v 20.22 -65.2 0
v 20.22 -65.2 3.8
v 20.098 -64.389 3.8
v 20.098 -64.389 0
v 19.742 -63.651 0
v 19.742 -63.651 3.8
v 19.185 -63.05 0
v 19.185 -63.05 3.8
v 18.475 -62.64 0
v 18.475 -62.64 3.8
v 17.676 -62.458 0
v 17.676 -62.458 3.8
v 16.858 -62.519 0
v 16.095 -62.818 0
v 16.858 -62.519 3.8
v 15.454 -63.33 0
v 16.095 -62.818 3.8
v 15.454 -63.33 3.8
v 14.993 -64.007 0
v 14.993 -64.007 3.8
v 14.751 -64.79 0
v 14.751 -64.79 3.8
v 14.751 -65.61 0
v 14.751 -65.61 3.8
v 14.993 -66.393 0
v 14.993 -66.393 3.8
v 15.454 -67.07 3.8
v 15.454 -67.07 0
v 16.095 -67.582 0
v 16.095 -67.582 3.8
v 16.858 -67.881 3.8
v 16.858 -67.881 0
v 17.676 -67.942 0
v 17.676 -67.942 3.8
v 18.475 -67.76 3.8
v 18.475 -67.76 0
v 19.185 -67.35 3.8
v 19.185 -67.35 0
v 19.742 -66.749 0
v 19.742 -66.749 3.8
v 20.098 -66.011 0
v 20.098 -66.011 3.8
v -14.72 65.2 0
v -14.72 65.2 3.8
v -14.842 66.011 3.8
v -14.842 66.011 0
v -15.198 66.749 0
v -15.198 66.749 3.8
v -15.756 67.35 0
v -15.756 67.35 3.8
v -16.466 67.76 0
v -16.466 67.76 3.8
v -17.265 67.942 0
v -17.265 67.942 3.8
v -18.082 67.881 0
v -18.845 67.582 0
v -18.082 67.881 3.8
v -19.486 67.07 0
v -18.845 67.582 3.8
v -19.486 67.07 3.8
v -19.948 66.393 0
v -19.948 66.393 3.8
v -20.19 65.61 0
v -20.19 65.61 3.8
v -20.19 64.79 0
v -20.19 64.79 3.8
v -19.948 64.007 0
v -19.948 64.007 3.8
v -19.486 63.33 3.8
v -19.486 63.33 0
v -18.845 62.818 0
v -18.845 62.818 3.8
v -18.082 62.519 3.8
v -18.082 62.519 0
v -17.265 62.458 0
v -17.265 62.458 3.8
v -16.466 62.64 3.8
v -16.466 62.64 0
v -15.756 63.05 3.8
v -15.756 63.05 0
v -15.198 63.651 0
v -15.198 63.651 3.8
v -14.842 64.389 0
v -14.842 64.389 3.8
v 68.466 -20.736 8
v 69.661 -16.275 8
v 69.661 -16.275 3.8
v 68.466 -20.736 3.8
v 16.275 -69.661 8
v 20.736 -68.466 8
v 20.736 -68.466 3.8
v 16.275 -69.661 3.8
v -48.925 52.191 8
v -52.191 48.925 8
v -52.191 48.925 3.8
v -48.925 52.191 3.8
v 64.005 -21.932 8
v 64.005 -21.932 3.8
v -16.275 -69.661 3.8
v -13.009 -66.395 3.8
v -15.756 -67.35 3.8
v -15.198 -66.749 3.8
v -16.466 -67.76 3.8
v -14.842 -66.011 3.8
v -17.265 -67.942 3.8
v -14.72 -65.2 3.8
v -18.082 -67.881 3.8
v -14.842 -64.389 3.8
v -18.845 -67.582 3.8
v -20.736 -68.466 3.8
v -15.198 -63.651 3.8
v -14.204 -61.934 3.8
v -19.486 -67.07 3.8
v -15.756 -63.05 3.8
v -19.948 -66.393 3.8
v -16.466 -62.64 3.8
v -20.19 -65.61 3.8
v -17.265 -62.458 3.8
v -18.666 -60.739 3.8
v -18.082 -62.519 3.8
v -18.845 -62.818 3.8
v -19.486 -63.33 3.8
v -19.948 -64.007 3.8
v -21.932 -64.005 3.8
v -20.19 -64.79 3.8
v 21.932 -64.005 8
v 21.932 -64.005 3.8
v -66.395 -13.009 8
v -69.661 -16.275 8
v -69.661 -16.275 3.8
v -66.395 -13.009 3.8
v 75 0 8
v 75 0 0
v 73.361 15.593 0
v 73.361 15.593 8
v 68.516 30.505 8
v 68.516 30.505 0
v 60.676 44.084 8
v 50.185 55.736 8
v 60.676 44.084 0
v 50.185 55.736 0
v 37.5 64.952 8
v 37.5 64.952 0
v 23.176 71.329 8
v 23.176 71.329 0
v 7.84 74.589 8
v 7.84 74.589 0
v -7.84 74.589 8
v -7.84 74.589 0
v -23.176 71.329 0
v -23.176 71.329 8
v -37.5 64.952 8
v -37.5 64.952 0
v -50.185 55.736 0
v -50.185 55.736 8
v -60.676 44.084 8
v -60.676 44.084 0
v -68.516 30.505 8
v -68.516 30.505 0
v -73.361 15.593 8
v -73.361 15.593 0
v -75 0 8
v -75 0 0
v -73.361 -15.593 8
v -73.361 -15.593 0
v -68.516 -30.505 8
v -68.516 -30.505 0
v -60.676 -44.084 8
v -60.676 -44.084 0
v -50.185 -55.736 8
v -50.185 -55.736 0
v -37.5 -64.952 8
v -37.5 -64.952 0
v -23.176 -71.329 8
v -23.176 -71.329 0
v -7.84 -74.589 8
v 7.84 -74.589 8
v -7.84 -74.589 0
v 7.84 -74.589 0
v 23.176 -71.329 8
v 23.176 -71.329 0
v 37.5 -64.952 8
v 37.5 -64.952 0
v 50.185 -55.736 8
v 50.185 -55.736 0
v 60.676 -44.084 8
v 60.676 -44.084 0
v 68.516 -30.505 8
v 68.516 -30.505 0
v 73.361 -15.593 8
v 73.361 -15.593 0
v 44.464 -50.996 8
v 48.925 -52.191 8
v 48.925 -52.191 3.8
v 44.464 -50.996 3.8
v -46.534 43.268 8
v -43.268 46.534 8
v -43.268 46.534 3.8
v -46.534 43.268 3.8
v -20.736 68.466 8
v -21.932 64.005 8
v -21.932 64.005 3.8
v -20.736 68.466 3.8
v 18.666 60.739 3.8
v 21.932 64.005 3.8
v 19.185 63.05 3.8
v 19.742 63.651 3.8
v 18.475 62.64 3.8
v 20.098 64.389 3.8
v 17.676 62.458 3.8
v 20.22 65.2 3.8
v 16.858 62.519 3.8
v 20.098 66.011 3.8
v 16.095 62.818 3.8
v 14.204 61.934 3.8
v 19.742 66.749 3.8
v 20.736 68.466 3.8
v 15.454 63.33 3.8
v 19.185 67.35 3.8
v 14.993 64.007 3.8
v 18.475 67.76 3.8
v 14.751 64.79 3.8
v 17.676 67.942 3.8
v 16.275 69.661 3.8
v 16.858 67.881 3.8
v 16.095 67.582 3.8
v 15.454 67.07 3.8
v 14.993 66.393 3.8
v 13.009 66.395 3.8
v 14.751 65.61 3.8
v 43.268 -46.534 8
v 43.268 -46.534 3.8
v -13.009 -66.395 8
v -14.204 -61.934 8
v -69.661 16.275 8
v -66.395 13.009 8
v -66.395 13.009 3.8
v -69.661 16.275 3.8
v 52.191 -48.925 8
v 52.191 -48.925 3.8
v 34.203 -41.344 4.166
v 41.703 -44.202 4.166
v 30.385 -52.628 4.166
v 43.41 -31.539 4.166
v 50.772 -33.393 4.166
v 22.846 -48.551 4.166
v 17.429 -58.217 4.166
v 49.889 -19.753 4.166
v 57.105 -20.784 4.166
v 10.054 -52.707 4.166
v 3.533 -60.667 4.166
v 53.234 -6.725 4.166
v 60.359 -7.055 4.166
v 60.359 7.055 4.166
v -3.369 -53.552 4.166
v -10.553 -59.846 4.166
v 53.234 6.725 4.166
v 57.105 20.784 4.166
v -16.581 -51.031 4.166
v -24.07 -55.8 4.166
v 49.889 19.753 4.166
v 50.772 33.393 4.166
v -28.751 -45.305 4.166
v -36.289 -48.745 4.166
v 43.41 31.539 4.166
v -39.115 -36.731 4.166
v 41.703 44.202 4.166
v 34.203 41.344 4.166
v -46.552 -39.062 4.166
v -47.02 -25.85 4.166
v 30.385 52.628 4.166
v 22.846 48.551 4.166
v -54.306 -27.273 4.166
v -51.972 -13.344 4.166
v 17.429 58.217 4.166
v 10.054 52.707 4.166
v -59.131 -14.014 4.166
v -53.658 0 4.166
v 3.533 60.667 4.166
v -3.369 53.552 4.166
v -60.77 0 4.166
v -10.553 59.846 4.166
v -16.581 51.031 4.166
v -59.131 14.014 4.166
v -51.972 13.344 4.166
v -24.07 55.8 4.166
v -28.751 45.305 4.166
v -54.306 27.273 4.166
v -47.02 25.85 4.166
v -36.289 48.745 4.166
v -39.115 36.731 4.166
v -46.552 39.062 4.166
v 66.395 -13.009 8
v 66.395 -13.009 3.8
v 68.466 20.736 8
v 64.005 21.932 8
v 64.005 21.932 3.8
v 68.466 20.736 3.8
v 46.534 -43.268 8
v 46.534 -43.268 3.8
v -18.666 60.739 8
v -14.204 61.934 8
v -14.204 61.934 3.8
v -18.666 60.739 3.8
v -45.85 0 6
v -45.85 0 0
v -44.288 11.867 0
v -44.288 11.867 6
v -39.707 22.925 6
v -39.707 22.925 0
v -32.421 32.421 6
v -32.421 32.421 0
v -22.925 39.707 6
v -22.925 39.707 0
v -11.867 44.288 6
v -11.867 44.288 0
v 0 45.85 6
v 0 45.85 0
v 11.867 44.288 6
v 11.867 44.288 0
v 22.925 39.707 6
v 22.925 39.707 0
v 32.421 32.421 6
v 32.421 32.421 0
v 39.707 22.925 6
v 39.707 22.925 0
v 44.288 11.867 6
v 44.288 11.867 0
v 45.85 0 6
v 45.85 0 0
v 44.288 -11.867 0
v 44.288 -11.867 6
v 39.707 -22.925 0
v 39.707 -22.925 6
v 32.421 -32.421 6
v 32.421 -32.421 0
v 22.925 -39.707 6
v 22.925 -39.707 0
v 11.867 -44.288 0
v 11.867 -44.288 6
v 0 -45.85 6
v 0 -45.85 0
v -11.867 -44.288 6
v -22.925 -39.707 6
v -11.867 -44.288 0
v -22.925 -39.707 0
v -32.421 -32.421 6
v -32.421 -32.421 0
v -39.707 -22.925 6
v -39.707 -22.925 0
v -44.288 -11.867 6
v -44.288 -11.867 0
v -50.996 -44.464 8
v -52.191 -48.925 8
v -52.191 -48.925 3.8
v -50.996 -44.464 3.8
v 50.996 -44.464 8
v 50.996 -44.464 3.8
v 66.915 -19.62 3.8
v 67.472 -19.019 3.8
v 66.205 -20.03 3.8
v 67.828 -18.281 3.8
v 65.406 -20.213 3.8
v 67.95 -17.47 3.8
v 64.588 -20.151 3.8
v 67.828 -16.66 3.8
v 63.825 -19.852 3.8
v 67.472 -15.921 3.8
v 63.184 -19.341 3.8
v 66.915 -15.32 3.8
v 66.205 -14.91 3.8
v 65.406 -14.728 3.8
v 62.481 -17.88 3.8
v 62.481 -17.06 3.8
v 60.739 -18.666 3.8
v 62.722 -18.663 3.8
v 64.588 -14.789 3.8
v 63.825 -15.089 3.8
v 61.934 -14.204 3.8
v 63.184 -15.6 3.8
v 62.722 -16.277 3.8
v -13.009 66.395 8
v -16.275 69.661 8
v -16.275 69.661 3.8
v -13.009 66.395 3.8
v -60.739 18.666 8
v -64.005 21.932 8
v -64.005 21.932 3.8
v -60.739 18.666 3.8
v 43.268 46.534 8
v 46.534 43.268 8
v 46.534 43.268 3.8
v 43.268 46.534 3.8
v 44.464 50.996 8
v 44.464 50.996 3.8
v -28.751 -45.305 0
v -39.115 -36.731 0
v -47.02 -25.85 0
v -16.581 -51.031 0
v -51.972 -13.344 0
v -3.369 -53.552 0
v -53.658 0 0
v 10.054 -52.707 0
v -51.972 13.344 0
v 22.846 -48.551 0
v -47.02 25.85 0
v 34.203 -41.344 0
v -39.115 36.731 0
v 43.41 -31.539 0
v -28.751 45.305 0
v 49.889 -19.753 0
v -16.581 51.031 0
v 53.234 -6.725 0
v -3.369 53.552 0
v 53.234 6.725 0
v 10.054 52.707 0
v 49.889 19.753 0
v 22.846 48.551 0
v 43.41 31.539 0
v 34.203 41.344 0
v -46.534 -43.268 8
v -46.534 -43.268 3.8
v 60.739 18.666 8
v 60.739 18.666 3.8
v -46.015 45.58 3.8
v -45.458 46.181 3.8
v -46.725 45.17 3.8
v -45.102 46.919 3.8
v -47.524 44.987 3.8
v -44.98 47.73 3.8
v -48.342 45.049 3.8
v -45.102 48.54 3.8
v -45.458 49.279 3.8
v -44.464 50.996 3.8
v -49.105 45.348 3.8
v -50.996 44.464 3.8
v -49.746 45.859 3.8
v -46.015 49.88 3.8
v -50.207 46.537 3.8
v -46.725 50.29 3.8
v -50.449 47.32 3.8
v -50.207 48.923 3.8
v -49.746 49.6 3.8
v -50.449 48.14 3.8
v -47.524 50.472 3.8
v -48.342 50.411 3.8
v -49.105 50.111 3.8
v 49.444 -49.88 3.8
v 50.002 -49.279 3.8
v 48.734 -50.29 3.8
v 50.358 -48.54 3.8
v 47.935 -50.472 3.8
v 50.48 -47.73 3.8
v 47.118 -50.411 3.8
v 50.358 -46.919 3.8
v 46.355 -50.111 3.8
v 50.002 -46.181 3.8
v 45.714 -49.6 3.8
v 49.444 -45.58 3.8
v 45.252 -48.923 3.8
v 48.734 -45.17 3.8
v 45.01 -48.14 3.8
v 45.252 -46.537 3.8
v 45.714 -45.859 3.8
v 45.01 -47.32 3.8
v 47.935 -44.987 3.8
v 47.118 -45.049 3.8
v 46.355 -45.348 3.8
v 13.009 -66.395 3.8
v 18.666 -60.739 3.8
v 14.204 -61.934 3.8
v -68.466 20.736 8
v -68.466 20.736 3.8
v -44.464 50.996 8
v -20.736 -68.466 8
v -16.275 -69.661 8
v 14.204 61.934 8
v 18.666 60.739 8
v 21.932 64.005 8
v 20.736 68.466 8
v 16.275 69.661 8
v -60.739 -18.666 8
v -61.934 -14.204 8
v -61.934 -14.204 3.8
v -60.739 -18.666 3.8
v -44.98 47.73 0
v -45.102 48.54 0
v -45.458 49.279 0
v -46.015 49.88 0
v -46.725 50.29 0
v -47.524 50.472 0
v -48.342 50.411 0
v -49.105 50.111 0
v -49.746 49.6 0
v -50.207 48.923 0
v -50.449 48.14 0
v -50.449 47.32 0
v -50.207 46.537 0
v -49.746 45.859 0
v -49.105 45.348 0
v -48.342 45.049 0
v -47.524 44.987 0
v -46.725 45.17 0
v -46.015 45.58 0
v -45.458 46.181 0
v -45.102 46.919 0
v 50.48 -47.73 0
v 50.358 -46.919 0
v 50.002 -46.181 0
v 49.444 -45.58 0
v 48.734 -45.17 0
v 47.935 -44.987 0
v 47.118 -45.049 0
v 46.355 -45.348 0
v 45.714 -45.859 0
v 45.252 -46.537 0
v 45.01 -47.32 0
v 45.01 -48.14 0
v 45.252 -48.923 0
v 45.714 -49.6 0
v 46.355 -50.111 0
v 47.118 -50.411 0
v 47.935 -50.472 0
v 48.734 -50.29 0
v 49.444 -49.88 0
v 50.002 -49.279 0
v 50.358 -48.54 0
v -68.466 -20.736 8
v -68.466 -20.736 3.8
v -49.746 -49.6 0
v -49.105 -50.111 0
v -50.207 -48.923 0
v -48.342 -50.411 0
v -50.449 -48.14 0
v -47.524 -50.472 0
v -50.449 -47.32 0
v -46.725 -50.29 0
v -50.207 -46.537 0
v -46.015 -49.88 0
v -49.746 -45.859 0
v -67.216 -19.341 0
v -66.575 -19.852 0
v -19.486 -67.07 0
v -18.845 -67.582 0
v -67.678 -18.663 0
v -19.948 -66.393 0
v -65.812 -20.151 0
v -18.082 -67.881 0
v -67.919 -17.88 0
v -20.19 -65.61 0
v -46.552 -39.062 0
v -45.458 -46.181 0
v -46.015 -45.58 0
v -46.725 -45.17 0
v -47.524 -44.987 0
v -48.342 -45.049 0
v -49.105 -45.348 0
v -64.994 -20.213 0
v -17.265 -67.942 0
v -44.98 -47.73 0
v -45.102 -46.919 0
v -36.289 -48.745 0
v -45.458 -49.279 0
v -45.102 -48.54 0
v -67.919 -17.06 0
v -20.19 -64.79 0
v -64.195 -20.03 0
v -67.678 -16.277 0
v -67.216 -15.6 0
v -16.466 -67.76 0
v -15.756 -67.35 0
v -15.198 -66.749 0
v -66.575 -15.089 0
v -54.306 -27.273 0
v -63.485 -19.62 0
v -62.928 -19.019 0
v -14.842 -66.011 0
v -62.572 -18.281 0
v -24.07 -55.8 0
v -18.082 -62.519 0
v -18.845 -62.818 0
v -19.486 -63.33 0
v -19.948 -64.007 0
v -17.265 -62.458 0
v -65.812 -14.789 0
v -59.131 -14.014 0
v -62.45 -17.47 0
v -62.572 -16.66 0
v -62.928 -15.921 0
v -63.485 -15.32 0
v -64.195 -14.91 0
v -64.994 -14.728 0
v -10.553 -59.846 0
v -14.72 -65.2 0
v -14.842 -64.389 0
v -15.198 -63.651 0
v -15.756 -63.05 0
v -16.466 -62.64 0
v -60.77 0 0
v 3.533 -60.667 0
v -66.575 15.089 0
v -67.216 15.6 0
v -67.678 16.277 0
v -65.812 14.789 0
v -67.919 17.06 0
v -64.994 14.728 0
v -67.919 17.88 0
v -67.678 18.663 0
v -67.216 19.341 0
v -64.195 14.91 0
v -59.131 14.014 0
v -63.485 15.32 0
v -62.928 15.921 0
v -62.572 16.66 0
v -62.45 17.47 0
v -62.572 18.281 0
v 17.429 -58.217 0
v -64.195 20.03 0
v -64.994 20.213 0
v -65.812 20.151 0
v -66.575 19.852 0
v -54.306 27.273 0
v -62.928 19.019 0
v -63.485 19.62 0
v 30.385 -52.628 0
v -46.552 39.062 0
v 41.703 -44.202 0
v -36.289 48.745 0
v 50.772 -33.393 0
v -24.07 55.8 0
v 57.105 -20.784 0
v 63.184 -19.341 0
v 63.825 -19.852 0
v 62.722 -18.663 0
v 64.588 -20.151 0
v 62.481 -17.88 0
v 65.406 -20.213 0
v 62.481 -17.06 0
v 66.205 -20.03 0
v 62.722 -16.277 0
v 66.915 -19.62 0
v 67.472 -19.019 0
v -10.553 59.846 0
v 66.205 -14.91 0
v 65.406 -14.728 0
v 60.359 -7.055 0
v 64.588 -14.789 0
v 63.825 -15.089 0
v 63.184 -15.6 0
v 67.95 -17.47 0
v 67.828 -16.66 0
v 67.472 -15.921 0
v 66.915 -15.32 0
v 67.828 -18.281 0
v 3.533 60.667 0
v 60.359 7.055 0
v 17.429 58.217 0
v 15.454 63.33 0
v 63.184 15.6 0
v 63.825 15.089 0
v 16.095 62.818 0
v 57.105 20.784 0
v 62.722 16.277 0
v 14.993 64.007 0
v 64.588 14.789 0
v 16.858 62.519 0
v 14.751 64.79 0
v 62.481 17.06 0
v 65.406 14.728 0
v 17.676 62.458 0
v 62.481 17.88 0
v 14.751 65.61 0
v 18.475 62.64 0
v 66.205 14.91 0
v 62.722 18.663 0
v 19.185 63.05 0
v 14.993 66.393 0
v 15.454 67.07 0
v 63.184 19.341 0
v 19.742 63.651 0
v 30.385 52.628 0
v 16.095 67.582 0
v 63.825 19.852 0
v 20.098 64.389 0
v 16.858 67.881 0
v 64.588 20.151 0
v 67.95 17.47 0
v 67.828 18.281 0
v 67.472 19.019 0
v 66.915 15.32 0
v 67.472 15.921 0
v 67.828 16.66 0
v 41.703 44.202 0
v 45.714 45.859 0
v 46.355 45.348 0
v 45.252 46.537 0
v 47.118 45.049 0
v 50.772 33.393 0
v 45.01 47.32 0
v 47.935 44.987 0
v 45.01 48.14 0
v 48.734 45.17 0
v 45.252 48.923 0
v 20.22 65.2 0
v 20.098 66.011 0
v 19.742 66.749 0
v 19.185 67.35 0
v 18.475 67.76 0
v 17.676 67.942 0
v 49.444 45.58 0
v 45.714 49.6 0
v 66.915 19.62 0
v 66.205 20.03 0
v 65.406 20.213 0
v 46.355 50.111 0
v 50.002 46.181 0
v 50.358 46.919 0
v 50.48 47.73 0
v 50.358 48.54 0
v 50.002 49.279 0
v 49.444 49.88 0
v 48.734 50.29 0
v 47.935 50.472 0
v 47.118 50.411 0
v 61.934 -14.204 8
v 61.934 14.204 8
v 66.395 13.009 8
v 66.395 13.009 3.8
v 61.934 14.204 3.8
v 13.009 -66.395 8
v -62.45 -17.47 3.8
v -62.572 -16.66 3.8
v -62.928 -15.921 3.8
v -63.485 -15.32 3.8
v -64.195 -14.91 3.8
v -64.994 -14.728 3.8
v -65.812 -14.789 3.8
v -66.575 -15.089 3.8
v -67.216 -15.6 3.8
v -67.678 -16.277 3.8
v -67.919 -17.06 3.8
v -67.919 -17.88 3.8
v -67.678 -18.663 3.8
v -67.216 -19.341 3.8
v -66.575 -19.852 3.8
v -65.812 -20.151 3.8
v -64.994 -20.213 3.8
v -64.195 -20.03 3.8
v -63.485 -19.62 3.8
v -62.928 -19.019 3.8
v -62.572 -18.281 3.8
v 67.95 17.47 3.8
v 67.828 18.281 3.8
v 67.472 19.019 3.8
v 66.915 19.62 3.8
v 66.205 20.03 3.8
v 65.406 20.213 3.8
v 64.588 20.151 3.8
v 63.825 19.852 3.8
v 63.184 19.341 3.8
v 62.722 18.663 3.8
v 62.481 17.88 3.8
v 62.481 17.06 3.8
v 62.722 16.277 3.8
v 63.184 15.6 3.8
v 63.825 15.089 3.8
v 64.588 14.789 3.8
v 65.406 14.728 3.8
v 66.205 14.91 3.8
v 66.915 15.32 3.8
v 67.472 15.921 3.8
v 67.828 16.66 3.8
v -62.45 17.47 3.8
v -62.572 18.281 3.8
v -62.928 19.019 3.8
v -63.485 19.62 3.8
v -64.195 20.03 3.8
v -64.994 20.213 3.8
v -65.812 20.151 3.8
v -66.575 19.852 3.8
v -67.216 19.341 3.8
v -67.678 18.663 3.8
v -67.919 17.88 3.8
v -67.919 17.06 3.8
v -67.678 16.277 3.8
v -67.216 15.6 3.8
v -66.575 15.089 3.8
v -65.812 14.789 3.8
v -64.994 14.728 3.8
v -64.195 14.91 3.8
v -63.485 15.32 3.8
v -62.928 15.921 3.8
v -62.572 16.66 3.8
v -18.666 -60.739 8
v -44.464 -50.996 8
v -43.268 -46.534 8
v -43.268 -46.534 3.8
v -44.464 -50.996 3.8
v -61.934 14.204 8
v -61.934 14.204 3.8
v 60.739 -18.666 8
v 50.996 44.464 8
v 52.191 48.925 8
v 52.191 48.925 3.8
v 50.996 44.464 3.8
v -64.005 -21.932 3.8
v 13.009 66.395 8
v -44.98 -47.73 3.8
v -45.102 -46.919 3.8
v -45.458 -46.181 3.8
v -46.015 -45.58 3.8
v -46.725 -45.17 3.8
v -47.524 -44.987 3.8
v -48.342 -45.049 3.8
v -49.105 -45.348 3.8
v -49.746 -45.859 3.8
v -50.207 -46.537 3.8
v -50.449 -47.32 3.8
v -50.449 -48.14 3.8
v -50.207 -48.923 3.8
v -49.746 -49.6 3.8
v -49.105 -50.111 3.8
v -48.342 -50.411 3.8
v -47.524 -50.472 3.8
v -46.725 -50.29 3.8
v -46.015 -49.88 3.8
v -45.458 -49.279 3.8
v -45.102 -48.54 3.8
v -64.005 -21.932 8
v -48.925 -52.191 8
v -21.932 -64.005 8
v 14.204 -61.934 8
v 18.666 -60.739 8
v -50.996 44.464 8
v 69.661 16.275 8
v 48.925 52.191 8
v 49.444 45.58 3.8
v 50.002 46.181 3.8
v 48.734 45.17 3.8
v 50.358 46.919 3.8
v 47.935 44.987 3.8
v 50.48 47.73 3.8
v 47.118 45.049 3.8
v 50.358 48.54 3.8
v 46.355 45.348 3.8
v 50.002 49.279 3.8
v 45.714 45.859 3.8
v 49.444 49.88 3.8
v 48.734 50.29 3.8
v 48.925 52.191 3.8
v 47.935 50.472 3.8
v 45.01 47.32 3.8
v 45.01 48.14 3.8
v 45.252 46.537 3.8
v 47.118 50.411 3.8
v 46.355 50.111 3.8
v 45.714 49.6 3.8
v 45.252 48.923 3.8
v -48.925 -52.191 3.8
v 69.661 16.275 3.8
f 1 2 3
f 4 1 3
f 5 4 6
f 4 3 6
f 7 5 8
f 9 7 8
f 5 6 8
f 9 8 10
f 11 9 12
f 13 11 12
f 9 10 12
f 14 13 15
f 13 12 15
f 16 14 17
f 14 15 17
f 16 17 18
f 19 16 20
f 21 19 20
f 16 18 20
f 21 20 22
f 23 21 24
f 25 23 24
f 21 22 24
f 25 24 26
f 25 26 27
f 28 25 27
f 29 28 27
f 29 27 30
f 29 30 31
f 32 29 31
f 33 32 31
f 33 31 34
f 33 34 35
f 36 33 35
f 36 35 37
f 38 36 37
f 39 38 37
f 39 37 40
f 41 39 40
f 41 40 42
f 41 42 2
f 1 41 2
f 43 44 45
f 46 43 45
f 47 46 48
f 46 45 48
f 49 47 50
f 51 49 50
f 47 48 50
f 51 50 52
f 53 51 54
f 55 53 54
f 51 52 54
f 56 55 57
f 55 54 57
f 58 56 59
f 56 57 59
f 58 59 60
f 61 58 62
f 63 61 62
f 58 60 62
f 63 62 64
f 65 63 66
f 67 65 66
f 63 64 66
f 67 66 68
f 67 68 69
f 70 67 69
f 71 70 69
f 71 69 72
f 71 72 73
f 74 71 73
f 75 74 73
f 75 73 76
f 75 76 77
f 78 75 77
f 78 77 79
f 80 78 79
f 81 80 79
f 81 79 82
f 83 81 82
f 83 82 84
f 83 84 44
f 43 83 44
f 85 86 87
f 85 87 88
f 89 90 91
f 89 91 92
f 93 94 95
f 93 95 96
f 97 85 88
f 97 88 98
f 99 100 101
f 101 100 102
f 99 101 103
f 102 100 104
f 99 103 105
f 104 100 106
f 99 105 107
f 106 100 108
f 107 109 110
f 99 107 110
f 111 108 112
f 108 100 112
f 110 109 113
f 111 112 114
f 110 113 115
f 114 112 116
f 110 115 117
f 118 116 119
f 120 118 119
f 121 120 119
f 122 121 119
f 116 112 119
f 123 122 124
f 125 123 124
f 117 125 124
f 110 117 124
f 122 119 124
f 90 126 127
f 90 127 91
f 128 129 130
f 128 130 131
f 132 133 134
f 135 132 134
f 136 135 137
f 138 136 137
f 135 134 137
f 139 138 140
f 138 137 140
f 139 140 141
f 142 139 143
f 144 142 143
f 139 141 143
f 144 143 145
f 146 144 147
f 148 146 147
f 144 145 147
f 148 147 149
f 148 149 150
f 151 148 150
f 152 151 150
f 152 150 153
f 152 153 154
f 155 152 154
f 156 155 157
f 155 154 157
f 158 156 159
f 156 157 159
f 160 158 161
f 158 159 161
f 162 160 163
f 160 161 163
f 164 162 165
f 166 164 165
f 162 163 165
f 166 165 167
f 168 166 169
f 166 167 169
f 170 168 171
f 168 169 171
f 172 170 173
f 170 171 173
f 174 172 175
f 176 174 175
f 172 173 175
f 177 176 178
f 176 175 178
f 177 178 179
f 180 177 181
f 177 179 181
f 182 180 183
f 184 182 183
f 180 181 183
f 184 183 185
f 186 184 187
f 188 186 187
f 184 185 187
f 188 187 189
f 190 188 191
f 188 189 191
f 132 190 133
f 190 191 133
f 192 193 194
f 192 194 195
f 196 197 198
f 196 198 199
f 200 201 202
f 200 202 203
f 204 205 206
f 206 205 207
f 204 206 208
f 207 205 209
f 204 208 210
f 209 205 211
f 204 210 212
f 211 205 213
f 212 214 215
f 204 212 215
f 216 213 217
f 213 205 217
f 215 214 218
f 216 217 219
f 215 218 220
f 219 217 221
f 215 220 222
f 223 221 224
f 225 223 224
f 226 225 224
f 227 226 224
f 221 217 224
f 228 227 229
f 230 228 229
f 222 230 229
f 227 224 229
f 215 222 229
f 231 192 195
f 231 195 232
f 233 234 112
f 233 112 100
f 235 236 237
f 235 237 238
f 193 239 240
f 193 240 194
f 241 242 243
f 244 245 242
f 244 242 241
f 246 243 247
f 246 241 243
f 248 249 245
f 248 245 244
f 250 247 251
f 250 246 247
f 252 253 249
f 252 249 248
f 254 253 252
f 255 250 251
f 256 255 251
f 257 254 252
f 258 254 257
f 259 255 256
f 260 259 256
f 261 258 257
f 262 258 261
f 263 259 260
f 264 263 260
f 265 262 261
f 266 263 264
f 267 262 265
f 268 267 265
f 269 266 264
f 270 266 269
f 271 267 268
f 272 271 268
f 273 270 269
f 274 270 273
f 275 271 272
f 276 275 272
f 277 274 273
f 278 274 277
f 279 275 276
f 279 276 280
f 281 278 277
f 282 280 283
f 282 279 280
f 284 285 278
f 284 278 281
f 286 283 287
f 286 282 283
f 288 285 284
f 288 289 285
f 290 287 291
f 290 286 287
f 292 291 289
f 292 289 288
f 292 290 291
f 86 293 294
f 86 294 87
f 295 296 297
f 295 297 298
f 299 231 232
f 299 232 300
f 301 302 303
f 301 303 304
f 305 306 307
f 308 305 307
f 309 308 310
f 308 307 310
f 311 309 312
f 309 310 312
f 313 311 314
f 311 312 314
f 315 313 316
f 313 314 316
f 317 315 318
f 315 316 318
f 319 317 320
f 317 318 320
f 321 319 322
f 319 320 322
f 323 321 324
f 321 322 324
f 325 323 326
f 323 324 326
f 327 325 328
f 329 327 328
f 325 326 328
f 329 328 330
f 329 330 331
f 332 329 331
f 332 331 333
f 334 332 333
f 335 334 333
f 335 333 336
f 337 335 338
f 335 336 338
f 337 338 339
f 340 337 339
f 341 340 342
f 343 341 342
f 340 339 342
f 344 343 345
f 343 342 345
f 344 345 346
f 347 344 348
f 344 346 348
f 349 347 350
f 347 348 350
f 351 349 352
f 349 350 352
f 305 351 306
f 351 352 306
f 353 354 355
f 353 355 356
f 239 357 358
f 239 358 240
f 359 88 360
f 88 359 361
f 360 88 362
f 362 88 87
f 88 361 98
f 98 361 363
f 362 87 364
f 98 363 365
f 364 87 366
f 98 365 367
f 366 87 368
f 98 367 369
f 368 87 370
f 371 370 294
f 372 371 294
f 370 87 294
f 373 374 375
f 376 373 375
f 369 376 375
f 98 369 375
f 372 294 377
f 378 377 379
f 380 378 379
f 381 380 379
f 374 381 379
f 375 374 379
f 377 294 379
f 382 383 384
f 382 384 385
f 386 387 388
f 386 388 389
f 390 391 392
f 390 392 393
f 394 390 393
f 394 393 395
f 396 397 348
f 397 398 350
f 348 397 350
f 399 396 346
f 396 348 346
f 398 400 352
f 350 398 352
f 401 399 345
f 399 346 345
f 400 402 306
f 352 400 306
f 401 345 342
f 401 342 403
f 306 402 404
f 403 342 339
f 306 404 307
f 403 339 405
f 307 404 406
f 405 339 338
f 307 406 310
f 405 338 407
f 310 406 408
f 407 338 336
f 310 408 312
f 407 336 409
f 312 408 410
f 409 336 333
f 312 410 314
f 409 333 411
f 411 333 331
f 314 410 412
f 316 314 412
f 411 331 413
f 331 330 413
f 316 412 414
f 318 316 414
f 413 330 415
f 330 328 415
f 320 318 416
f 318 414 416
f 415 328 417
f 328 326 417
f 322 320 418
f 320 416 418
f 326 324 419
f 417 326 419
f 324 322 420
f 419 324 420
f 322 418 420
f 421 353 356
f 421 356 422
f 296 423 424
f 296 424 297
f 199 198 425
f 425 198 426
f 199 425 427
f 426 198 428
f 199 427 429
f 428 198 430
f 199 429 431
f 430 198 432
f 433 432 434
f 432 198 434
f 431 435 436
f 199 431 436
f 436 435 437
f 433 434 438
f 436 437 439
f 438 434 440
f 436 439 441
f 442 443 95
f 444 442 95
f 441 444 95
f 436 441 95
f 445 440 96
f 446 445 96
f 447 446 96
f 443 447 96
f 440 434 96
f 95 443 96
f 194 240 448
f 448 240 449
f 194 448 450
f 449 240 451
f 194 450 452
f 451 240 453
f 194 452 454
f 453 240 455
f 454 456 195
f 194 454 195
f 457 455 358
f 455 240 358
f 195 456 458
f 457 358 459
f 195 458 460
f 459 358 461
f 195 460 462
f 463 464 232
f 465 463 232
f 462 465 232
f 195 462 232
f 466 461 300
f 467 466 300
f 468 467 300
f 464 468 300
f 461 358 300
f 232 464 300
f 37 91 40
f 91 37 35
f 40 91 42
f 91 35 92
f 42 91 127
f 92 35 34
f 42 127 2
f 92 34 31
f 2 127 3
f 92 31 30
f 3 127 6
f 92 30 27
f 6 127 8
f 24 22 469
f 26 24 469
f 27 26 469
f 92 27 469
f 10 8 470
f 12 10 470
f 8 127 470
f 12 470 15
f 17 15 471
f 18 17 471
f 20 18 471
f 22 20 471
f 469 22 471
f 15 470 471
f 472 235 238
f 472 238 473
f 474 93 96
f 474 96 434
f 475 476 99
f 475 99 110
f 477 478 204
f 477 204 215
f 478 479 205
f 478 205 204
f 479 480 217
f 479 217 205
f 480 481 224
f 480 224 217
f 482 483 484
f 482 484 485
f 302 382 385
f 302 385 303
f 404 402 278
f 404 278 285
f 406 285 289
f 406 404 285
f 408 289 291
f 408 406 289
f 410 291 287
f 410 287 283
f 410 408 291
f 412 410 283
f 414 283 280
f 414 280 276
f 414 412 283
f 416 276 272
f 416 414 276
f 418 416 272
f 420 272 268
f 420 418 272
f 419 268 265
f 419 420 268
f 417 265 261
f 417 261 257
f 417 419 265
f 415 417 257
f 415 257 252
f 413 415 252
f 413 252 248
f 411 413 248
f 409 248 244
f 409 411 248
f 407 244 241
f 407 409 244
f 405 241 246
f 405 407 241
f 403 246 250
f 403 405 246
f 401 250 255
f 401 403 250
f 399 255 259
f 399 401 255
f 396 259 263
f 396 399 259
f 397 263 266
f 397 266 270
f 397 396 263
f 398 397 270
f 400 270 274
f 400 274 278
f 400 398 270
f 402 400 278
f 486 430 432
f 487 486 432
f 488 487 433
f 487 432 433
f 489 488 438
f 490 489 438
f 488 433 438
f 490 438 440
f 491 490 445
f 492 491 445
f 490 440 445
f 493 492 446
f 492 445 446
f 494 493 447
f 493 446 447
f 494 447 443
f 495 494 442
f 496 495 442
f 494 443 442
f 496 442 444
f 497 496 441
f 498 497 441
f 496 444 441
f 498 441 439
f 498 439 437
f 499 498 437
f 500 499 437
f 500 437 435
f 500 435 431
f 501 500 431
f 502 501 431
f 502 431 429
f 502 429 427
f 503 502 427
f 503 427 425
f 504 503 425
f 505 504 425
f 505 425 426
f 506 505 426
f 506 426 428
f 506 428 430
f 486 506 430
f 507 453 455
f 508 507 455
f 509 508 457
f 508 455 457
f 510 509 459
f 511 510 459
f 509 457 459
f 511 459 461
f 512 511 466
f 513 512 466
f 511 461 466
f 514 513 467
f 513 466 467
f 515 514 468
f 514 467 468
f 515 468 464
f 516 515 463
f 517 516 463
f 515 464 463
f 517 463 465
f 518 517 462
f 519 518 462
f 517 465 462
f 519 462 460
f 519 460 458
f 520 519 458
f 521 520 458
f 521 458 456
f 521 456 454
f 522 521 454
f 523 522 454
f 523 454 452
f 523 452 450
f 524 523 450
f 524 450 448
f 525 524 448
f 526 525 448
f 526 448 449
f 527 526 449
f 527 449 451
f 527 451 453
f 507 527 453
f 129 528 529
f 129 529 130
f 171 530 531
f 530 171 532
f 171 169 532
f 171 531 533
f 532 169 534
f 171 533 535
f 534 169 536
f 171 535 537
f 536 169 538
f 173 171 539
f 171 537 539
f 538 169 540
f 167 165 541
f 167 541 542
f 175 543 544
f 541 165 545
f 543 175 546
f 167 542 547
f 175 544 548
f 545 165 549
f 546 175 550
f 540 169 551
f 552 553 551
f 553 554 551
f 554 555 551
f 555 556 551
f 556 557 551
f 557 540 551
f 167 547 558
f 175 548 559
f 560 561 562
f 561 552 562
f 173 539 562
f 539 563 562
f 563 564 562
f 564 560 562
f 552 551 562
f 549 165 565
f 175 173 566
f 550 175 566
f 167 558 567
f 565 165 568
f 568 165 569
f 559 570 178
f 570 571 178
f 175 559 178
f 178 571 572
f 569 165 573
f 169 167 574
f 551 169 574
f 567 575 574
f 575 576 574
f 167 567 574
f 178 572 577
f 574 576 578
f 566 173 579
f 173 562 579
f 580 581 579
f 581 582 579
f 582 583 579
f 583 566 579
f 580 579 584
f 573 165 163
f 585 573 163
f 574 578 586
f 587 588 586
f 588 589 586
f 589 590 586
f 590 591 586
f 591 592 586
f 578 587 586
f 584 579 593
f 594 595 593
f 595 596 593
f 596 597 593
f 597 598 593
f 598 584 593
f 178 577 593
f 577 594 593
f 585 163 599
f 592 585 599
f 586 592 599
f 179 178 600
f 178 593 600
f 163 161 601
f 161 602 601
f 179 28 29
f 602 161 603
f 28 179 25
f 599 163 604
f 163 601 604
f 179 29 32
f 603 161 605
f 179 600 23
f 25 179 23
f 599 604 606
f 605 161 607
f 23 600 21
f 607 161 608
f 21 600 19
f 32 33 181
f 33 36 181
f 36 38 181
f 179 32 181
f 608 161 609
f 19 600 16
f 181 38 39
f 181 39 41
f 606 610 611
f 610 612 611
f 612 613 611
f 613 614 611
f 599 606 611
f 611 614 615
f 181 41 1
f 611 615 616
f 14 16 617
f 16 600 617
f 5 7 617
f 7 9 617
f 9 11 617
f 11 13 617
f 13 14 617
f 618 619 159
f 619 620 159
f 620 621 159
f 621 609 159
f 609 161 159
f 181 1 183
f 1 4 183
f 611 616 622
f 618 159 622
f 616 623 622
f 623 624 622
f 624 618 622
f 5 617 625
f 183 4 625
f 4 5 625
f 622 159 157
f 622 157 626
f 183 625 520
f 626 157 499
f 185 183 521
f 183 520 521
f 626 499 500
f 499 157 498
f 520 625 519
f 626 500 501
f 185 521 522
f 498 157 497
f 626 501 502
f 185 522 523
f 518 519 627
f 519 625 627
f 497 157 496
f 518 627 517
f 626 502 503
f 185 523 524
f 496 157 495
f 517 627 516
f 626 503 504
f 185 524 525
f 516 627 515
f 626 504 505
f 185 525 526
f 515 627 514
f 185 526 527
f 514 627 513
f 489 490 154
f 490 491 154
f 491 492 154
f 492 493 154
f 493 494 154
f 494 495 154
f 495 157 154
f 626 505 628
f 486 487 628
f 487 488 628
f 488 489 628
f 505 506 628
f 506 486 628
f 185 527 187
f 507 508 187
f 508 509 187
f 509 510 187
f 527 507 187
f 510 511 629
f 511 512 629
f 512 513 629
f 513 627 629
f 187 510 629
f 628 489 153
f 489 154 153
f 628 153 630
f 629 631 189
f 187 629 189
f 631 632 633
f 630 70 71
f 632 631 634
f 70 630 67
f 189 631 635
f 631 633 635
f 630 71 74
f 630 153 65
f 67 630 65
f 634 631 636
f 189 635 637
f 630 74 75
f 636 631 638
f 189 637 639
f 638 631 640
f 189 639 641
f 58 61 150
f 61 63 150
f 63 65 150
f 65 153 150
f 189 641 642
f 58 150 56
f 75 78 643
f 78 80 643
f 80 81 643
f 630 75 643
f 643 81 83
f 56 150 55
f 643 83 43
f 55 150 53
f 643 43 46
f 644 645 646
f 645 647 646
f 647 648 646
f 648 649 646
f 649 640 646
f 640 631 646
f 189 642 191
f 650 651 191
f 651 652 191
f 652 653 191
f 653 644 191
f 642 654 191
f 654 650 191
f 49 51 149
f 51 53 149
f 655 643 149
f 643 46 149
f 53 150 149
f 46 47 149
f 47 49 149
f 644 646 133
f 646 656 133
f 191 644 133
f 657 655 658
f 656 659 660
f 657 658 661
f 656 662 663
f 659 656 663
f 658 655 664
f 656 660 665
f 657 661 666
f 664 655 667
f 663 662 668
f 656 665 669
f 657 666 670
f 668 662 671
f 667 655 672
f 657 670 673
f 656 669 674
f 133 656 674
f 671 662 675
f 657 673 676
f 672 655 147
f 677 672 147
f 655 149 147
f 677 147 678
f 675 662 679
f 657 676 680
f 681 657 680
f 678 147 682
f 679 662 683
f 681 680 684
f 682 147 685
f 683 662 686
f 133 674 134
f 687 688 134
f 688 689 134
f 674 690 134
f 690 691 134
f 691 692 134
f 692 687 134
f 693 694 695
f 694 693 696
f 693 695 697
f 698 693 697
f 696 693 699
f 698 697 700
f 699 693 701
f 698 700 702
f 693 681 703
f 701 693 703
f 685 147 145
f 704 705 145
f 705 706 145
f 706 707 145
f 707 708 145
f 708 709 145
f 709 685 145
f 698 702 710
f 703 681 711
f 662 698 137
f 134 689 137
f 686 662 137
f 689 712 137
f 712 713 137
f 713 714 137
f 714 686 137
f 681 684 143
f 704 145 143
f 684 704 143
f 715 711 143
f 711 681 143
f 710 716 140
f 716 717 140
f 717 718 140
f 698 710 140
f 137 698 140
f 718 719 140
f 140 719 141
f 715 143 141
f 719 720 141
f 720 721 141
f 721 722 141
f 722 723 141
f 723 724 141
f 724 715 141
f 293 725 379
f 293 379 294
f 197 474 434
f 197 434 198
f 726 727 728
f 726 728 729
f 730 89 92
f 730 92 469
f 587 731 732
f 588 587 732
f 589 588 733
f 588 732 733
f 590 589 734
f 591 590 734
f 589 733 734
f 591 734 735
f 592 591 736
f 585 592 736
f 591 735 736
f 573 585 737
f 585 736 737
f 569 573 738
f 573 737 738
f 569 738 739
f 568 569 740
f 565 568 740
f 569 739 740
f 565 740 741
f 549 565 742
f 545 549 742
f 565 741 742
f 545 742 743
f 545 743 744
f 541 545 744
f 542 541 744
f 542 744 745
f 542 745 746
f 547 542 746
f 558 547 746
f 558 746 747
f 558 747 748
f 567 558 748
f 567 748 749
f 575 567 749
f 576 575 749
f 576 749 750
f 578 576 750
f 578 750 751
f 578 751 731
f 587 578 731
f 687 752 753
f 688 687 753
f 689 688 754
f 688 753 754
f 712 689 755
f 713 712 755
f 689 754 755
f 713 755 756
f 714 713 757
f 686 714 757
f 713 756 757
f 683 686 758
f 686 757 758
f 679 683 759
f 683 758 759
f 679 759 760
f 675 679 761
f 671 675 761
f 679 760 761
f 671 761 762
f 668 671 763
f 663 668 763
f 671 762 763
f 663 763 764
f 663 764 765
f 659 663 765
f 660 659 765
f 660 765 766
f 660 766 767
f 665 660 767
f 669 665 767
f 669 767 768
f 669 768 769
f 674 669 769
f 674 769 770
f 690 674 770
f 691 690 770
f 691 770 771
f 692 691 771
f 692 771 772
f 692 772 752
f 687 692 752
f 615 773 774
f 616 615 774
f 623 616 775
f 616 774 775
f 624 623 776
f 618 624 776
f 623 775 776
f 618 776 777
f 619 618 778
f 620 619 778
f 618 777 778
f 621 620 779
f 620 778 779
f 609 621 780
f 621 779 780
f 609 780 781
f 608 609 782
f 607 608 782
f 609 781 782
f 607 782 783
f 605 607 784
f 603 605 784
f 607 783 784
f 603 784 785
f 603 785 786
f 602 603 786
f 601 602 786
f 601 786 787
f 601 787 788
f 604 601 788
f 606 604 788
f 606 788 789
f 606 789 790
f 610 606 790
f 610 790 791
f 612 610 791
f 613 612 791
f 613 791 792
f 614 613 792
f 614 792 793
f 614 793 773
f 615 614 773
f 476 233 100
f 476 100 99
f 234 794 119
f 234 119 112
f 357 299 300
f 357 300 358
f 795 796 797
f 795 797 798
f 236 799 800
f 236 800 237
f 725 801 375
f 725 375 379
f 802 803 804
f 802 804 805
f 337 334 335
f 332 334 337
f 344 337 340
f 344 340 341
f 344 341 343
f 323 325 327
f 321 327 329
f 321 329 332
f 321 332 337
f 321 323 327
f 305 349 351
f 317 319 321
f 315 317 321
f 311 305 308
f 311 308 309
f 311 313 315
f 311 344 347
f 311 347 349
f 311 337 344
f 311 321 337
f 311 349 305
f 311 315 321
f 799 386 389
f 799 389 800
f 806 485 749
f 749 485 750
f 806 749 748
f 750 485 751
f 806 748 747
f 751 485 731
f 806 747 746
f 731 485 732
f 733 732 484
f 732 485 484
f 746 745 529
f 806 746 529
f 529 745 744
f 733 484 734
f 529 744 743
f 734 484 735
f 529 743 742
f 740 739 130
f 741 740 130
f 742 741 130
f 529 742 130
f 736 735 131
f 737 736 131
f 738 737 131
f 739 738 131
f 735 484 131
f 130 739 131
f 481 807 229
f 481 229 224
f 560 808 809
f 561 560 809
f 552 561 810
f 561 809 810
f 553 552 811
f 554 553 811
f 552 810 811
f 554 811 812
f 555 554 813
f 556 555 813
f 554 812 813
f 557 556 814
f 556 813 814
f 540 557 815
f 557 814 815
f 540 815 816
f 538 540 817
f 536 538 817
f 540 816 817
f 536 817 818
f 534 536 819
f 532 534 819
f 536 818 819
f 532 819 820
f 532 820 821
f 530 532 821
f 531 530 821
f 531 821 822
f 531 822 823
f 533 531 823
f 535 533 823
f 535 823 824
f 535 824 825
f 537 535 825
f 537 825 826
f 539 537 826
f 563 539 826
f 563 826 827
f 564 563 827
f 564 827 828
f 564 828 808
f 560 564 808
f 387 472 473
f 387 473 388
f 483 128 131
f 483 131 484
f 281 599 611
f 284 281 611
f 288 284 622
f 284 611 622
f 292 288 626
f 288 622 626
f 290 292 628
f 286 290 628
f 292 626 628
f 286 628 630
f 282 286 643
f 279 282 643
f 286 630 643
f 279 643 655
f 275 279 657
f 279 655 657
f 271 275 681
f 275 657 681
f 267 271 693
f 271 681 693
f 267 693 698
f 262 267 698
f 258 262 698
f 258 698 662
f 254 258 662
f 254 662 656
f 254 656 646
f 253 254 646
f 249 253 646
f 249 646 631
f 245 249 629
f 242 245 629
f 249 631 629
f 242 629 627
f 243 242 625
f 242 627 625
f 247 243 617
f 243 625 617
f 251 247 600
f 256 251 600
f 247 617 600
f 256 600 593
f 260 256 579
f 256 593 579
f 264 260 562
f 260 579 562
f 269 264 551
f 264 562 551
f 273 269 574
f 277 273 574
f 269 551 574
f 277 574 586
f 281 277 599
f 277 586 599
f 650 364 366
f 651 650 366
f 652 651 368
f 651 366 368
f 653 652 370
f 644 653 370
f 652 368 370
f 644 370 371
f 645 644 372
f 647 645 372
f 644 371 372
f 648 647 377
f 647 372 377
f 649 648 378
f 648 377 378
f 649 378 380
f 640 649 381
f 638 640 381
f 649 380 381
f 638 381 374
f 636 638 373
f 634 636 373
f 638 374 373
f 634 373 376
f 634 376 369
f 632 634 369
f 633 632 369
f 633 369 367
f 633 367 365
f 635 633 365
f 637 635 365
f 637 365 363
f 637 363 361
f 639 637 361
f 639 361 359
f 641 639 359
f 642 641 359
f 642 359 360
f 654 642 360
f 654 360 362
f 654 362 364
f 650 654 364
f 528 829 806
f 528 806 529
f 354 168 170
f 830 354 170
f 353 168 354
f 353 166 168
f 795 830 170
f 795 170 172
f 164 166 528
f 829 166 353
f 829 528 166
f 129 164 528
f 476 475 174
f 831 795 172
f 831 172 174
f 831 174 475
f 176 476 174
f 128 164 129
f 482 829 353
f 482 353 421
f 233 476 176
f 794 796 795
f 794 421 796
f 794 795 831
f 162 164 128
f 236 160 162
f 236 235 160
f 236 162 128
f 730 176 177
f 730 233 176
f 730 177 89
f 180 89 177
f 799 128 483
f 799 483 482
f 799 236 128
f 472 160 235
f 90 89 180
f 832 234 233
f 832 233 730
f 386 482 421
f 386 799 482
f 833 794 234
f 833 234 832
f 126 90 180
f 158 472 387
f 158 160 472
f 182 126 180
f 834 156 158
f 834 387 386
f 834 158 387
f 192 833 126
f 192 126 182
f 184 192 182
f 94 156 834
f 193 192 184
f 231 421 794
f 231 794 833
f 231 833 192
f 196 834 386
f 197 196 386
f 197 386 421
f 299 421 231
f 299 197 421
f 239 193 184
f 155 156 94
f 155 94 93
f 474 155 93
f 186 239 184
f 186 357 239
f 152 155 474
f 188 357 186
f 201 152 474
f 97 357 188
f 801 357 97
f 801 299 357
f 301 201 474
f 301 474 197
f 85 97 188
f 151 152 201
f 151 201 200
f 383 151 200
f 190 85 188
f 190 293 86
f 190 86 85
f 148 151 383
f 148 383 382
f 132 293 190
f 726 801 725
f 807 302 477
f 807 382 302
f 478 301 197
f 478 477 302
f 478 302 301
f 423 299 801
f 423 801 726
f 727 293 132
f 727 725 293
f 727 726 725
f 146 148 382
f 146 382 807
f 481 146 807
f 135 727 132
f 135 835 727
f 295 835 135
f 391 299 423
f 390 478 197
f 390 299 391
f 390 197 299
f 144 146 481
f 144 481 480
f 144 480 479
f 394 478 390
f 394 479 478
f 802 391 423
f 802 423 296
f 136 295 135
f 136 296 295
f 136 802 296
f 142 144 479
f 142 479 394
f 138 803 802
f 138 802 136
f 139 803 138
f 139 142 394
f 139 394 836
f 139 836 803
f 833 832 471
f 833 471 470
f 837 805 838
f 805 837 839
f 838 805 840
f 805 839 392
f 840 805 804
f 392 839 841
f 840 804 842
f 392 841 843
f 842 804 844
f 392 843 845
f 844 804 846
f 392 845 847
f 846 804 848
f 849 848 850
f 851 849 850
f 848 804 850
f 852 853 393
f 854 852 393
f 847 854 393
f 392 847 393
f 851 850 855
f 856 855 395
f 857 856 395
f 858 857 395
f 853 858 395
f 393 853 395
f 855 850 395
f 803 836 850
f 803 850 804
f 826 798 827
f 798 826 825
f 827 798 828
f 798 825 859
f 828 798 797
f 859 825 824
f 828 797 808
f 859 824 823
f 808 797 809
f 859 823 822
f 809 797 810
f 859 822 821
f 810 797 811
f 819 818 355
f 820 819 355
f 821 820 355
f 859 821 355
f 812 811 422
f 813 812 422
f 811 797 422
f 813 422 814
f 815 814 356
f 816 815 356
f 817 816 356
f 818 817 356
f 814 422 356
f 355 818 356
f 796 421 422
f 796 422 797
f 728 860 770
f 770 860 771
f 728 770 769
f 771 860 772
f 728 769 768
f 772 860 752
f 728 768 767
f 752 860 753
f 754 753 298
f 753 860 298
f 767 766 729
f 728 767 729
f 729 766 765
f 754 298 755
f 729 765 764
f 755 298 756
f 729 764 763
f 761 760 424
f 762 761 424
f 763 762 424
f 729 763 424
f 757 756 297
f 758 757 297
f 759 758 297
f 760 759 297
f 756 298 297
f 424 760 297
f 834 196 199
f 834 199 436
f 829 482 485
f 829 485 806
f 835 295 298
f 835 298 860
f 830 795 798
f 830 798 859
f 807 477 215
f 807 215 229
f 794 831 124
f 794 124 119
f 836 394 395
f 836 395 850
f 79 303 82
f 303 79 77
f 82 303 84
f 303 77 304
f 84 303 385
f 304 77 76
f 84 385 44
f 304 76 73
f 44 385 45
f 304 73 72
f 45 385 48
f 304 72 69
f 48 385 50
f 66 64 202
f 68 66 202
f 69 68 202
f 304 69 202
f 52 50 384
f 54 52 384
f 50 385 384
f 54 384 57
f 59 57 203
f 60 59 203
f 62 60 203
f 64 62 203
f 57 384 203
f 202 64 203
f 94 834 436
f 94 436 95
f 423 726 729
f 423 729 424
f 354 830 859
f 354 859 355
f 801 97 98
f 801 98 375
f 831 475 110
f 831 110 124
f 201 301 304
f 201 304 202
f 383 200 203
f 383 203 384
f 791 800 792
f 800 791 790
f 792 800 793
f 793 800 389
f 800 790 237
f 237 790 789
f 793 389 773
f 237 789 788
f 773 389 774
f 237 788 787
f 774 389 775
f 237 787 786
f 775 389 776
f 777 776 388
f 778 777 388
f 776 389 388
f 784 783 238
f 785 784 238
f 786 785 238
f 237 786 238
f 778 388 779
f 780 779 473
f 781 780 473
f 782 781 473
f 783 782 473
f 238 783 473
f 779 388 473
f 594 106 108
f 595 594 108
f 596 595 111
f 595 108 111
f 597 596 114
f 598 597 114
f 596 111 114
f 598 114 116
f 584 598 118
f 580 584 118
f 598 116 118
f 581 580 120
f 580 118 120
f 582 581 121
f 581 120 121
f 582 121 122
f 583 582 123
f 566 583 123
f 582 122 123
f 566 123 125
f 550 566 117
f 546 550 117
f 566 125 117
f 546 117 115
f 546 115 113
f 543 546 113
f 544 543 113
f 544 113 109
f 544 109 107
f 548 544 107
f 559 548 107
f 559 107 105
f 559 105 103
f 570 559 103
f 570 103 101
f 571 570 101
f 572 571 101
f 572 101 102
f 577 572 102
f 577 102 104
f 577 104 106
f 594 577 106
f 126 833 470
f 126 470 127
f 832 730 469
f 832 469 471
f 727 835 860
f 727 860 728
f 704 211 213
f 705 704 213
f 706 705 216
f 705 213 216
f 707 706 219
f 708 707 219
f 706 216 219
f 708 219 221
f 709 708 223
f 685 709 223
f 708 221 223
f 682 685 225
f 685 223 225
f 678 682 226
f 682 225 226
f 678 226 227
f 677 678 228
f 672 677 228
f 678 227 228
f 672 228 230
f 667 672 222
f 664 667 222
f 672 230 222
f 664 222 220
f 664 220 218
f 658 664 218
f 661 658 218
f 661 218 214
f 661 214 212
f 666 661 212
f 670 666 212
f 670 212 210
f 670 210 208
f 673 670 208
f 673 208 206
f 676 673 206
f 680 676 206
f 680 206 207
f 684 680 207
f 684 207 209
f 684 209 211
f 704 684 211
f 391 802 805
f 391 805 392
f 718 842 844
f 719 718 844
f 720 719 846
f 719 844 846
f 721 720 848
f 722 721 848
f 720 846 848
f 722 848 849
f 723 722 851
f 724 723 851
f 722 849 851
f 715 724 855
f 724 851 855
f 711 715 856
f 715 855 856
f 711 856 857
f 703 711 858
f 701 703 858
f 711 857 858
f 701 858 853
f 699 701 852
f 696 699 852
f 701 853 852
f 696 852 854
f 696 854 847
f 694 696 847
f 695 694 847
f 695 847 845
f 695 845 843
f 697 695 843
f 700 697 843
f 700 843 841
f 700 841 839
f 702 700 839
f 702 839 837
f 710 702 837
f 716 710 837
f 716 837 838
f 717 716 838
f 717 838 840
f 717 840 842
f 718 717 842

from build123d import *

# Parameters (mm, degrees)
SKETCH1_R            = 75
BOSS_EXTRUDE1_DEPTH  = 8
M5_CLEARANCE_HOLE1_D = 5.5
CUT_EXTRUDE2_DEPTH   = 4.2
SKETCH11_R           = 45.85
CUT_EXTRUDE3_DEPTH   = 6
SKETCH12_R           = 60.7695
SKETCH12_R_2         = 53.6575
CUT_EXTRUDE4_DEPTH   = 4.1656


with BuildPart() as part:
    # Sketch1 → Boss-Extrude1 (new body)
    with BuildSketch(Plane.XY):
        Circle(SKETCH1_R)
    extrude(amount=BOSS_EXTRUDE1_DEPTH)

    # M5 Clearance Hole1 (through all)
    with Locations(Plane(origin=(0, 0, 0), x_dir=(-1, 0, 0), z_dir=(0, 0, -1))):
        with Locations((-17.470285544, -65.199993275), (-47.72970773, 47.72970773), (65.199993275, -17.470285544), (47.72970773, -47.72970773), (-65.199993275, 17.470285544), (-17.470285544, 65.199993275), (-65.199993275, -17.470285544), (-47.72970773, -47.72970773), (17.470285544, -65.199993275), (65.199993275, 17.470285544), (47.72970773, 47.72970773), (17.470285544, 65.199993275)):
            Hole(M5_CLEARANCE_HOLE1_D / 2)

    # Sketch6 → Cut-Extrude2 (cut)
    with BuildSketch(Plane(origin=(0, 0, 8), x_dir=(-1, 0, 0), z_dir=(0, 0, -1))):
        Polygon((-43.268287443, 46.534273767), (-44.463721406, 50.995694054), (-48.925141693, 52.191128017), (-52.191128017, 48.925141693), (-50.995694054, 44.463721406), (-46.534273767, 43.268287443), align=None)
        Polygon((-13.008865258, 66.395427237), (-16.274851582, 69.661413561), (-20.736271868, 68.465979598), (-21.931705831, 64.004559312), (-18.665719507, 60.738572988), (-14.204299221, 61.934006951), align=None)
        Polygon((21.931705831, 64.004559312), (20.736271868, 68.465979598), (16.274851582, 69.661413561), (13.008865258, 66.395427237), (14.204299221, 61.934006951), (18.665719507, 60.738572988), align=None)
        Polygon((50.995694054, 44.463721406), (52.191128017, 48.925141693), (48.925141693, 52.191128017), (44.463721406, 50.995694054), (43.268287443, 46.534273767), (46.534273767, 43.268287444), align=None)
        Polygon((66.395427237, 13.008865258), (69.661413561, 16.274851582), (68.465979598, 20.736271868), (64.004559312, 21.931705831), (60.738572988, 18.665719507), (61.934006951, 14.204299221), align=None)
        Polygon((64.004559312, -21.931705831), (68.465979598, -20.736271868), (69.661413561, -16.274851582), (66.395427237, -13.008865258), (61.934006951, -14.204299221), (60.738572988, -18.665719507), align=None)
        Polygon((44.463721406, -50.995694054), (48.925141693, -52.191128017), (52.191128017, -48.925141693), (50.995694054, -44.463721406), (46.534273767, -43.268287443), (43.268287444, -46.534273767), align=None)
        Polygon((13.008865258, -66.395427237), (16.274851582, -69.661413561), (20.736271868, -68.465979598), (21.931705831, -64.004559312), (18.665719507, -60.738572988), (14.204299221, -61.934006951), align=None)
        Polygon((-21.931705831, -64.004559312), (-20.736271868, -68.465979598), (-16.274851582, -69.661413561), (-13.008865258, -66.395427237), (-14.204299221, -61.934006951), (-18.665719507, -60.738572988), align=None)
        Polygon((-50.995694054, -44.463721406), (-52.191128017, -48.925141693), (-48.925141693, -52.191128017), (-44.463721406, -50.995694054), (-43.268287443, -46.534273767), (-46.534273767, -43.268287443), align=None)
        Polygon((-66.395427237, -13.008865258), (-69.661413561, -16.274851582), (-68.465979598, -20.736271868), (-64.004559312, -21.931705831), (-60.738572988, -18.665719507), (-61.934006951, -14.204299221), align=None)
        Polygon((-64.004559312, 21.931705831), (-68.465979598, 20.736271868), (-69.661413561, 16.274851582), (-66.395427237, 13.008865258), (-61.934006951, 14.204299221), (-60.738572988, 18.665719507), align=None)
    extrude(amount=CUT_EXTRUDE2_DEPTH, mode=Mode.SUBTRACT)

    # Sketch11 → Cut-Extrude3 (cut)
    with BuildSketch(Plane(origin=(0, 0, 0), x_dir=(-1, 0, 0), z_dir=(0, 0, -1))):
        Circle(SKETCH11_R)
    extrude(amount=-CUT_EXTRUDE3_DEPTH, mode=Mode.SUBTRACT)

    # Sketch12 → Cut-Extrude4 (cut)
    with BuildSketch(Plane(origin=(0, 0, 0), x_dir=(-1, 0, 0), z_dir=(0, 0, -1))):
        Circle(SKETCH12_R)
        Circle(SKETCH12_R_2, mode=Mode.SUBTRACT)
    extrude(amount=-CUT_EXTRUDE4_DEPTH, mode=Mode.SUBTRACT)


solid = part.part
